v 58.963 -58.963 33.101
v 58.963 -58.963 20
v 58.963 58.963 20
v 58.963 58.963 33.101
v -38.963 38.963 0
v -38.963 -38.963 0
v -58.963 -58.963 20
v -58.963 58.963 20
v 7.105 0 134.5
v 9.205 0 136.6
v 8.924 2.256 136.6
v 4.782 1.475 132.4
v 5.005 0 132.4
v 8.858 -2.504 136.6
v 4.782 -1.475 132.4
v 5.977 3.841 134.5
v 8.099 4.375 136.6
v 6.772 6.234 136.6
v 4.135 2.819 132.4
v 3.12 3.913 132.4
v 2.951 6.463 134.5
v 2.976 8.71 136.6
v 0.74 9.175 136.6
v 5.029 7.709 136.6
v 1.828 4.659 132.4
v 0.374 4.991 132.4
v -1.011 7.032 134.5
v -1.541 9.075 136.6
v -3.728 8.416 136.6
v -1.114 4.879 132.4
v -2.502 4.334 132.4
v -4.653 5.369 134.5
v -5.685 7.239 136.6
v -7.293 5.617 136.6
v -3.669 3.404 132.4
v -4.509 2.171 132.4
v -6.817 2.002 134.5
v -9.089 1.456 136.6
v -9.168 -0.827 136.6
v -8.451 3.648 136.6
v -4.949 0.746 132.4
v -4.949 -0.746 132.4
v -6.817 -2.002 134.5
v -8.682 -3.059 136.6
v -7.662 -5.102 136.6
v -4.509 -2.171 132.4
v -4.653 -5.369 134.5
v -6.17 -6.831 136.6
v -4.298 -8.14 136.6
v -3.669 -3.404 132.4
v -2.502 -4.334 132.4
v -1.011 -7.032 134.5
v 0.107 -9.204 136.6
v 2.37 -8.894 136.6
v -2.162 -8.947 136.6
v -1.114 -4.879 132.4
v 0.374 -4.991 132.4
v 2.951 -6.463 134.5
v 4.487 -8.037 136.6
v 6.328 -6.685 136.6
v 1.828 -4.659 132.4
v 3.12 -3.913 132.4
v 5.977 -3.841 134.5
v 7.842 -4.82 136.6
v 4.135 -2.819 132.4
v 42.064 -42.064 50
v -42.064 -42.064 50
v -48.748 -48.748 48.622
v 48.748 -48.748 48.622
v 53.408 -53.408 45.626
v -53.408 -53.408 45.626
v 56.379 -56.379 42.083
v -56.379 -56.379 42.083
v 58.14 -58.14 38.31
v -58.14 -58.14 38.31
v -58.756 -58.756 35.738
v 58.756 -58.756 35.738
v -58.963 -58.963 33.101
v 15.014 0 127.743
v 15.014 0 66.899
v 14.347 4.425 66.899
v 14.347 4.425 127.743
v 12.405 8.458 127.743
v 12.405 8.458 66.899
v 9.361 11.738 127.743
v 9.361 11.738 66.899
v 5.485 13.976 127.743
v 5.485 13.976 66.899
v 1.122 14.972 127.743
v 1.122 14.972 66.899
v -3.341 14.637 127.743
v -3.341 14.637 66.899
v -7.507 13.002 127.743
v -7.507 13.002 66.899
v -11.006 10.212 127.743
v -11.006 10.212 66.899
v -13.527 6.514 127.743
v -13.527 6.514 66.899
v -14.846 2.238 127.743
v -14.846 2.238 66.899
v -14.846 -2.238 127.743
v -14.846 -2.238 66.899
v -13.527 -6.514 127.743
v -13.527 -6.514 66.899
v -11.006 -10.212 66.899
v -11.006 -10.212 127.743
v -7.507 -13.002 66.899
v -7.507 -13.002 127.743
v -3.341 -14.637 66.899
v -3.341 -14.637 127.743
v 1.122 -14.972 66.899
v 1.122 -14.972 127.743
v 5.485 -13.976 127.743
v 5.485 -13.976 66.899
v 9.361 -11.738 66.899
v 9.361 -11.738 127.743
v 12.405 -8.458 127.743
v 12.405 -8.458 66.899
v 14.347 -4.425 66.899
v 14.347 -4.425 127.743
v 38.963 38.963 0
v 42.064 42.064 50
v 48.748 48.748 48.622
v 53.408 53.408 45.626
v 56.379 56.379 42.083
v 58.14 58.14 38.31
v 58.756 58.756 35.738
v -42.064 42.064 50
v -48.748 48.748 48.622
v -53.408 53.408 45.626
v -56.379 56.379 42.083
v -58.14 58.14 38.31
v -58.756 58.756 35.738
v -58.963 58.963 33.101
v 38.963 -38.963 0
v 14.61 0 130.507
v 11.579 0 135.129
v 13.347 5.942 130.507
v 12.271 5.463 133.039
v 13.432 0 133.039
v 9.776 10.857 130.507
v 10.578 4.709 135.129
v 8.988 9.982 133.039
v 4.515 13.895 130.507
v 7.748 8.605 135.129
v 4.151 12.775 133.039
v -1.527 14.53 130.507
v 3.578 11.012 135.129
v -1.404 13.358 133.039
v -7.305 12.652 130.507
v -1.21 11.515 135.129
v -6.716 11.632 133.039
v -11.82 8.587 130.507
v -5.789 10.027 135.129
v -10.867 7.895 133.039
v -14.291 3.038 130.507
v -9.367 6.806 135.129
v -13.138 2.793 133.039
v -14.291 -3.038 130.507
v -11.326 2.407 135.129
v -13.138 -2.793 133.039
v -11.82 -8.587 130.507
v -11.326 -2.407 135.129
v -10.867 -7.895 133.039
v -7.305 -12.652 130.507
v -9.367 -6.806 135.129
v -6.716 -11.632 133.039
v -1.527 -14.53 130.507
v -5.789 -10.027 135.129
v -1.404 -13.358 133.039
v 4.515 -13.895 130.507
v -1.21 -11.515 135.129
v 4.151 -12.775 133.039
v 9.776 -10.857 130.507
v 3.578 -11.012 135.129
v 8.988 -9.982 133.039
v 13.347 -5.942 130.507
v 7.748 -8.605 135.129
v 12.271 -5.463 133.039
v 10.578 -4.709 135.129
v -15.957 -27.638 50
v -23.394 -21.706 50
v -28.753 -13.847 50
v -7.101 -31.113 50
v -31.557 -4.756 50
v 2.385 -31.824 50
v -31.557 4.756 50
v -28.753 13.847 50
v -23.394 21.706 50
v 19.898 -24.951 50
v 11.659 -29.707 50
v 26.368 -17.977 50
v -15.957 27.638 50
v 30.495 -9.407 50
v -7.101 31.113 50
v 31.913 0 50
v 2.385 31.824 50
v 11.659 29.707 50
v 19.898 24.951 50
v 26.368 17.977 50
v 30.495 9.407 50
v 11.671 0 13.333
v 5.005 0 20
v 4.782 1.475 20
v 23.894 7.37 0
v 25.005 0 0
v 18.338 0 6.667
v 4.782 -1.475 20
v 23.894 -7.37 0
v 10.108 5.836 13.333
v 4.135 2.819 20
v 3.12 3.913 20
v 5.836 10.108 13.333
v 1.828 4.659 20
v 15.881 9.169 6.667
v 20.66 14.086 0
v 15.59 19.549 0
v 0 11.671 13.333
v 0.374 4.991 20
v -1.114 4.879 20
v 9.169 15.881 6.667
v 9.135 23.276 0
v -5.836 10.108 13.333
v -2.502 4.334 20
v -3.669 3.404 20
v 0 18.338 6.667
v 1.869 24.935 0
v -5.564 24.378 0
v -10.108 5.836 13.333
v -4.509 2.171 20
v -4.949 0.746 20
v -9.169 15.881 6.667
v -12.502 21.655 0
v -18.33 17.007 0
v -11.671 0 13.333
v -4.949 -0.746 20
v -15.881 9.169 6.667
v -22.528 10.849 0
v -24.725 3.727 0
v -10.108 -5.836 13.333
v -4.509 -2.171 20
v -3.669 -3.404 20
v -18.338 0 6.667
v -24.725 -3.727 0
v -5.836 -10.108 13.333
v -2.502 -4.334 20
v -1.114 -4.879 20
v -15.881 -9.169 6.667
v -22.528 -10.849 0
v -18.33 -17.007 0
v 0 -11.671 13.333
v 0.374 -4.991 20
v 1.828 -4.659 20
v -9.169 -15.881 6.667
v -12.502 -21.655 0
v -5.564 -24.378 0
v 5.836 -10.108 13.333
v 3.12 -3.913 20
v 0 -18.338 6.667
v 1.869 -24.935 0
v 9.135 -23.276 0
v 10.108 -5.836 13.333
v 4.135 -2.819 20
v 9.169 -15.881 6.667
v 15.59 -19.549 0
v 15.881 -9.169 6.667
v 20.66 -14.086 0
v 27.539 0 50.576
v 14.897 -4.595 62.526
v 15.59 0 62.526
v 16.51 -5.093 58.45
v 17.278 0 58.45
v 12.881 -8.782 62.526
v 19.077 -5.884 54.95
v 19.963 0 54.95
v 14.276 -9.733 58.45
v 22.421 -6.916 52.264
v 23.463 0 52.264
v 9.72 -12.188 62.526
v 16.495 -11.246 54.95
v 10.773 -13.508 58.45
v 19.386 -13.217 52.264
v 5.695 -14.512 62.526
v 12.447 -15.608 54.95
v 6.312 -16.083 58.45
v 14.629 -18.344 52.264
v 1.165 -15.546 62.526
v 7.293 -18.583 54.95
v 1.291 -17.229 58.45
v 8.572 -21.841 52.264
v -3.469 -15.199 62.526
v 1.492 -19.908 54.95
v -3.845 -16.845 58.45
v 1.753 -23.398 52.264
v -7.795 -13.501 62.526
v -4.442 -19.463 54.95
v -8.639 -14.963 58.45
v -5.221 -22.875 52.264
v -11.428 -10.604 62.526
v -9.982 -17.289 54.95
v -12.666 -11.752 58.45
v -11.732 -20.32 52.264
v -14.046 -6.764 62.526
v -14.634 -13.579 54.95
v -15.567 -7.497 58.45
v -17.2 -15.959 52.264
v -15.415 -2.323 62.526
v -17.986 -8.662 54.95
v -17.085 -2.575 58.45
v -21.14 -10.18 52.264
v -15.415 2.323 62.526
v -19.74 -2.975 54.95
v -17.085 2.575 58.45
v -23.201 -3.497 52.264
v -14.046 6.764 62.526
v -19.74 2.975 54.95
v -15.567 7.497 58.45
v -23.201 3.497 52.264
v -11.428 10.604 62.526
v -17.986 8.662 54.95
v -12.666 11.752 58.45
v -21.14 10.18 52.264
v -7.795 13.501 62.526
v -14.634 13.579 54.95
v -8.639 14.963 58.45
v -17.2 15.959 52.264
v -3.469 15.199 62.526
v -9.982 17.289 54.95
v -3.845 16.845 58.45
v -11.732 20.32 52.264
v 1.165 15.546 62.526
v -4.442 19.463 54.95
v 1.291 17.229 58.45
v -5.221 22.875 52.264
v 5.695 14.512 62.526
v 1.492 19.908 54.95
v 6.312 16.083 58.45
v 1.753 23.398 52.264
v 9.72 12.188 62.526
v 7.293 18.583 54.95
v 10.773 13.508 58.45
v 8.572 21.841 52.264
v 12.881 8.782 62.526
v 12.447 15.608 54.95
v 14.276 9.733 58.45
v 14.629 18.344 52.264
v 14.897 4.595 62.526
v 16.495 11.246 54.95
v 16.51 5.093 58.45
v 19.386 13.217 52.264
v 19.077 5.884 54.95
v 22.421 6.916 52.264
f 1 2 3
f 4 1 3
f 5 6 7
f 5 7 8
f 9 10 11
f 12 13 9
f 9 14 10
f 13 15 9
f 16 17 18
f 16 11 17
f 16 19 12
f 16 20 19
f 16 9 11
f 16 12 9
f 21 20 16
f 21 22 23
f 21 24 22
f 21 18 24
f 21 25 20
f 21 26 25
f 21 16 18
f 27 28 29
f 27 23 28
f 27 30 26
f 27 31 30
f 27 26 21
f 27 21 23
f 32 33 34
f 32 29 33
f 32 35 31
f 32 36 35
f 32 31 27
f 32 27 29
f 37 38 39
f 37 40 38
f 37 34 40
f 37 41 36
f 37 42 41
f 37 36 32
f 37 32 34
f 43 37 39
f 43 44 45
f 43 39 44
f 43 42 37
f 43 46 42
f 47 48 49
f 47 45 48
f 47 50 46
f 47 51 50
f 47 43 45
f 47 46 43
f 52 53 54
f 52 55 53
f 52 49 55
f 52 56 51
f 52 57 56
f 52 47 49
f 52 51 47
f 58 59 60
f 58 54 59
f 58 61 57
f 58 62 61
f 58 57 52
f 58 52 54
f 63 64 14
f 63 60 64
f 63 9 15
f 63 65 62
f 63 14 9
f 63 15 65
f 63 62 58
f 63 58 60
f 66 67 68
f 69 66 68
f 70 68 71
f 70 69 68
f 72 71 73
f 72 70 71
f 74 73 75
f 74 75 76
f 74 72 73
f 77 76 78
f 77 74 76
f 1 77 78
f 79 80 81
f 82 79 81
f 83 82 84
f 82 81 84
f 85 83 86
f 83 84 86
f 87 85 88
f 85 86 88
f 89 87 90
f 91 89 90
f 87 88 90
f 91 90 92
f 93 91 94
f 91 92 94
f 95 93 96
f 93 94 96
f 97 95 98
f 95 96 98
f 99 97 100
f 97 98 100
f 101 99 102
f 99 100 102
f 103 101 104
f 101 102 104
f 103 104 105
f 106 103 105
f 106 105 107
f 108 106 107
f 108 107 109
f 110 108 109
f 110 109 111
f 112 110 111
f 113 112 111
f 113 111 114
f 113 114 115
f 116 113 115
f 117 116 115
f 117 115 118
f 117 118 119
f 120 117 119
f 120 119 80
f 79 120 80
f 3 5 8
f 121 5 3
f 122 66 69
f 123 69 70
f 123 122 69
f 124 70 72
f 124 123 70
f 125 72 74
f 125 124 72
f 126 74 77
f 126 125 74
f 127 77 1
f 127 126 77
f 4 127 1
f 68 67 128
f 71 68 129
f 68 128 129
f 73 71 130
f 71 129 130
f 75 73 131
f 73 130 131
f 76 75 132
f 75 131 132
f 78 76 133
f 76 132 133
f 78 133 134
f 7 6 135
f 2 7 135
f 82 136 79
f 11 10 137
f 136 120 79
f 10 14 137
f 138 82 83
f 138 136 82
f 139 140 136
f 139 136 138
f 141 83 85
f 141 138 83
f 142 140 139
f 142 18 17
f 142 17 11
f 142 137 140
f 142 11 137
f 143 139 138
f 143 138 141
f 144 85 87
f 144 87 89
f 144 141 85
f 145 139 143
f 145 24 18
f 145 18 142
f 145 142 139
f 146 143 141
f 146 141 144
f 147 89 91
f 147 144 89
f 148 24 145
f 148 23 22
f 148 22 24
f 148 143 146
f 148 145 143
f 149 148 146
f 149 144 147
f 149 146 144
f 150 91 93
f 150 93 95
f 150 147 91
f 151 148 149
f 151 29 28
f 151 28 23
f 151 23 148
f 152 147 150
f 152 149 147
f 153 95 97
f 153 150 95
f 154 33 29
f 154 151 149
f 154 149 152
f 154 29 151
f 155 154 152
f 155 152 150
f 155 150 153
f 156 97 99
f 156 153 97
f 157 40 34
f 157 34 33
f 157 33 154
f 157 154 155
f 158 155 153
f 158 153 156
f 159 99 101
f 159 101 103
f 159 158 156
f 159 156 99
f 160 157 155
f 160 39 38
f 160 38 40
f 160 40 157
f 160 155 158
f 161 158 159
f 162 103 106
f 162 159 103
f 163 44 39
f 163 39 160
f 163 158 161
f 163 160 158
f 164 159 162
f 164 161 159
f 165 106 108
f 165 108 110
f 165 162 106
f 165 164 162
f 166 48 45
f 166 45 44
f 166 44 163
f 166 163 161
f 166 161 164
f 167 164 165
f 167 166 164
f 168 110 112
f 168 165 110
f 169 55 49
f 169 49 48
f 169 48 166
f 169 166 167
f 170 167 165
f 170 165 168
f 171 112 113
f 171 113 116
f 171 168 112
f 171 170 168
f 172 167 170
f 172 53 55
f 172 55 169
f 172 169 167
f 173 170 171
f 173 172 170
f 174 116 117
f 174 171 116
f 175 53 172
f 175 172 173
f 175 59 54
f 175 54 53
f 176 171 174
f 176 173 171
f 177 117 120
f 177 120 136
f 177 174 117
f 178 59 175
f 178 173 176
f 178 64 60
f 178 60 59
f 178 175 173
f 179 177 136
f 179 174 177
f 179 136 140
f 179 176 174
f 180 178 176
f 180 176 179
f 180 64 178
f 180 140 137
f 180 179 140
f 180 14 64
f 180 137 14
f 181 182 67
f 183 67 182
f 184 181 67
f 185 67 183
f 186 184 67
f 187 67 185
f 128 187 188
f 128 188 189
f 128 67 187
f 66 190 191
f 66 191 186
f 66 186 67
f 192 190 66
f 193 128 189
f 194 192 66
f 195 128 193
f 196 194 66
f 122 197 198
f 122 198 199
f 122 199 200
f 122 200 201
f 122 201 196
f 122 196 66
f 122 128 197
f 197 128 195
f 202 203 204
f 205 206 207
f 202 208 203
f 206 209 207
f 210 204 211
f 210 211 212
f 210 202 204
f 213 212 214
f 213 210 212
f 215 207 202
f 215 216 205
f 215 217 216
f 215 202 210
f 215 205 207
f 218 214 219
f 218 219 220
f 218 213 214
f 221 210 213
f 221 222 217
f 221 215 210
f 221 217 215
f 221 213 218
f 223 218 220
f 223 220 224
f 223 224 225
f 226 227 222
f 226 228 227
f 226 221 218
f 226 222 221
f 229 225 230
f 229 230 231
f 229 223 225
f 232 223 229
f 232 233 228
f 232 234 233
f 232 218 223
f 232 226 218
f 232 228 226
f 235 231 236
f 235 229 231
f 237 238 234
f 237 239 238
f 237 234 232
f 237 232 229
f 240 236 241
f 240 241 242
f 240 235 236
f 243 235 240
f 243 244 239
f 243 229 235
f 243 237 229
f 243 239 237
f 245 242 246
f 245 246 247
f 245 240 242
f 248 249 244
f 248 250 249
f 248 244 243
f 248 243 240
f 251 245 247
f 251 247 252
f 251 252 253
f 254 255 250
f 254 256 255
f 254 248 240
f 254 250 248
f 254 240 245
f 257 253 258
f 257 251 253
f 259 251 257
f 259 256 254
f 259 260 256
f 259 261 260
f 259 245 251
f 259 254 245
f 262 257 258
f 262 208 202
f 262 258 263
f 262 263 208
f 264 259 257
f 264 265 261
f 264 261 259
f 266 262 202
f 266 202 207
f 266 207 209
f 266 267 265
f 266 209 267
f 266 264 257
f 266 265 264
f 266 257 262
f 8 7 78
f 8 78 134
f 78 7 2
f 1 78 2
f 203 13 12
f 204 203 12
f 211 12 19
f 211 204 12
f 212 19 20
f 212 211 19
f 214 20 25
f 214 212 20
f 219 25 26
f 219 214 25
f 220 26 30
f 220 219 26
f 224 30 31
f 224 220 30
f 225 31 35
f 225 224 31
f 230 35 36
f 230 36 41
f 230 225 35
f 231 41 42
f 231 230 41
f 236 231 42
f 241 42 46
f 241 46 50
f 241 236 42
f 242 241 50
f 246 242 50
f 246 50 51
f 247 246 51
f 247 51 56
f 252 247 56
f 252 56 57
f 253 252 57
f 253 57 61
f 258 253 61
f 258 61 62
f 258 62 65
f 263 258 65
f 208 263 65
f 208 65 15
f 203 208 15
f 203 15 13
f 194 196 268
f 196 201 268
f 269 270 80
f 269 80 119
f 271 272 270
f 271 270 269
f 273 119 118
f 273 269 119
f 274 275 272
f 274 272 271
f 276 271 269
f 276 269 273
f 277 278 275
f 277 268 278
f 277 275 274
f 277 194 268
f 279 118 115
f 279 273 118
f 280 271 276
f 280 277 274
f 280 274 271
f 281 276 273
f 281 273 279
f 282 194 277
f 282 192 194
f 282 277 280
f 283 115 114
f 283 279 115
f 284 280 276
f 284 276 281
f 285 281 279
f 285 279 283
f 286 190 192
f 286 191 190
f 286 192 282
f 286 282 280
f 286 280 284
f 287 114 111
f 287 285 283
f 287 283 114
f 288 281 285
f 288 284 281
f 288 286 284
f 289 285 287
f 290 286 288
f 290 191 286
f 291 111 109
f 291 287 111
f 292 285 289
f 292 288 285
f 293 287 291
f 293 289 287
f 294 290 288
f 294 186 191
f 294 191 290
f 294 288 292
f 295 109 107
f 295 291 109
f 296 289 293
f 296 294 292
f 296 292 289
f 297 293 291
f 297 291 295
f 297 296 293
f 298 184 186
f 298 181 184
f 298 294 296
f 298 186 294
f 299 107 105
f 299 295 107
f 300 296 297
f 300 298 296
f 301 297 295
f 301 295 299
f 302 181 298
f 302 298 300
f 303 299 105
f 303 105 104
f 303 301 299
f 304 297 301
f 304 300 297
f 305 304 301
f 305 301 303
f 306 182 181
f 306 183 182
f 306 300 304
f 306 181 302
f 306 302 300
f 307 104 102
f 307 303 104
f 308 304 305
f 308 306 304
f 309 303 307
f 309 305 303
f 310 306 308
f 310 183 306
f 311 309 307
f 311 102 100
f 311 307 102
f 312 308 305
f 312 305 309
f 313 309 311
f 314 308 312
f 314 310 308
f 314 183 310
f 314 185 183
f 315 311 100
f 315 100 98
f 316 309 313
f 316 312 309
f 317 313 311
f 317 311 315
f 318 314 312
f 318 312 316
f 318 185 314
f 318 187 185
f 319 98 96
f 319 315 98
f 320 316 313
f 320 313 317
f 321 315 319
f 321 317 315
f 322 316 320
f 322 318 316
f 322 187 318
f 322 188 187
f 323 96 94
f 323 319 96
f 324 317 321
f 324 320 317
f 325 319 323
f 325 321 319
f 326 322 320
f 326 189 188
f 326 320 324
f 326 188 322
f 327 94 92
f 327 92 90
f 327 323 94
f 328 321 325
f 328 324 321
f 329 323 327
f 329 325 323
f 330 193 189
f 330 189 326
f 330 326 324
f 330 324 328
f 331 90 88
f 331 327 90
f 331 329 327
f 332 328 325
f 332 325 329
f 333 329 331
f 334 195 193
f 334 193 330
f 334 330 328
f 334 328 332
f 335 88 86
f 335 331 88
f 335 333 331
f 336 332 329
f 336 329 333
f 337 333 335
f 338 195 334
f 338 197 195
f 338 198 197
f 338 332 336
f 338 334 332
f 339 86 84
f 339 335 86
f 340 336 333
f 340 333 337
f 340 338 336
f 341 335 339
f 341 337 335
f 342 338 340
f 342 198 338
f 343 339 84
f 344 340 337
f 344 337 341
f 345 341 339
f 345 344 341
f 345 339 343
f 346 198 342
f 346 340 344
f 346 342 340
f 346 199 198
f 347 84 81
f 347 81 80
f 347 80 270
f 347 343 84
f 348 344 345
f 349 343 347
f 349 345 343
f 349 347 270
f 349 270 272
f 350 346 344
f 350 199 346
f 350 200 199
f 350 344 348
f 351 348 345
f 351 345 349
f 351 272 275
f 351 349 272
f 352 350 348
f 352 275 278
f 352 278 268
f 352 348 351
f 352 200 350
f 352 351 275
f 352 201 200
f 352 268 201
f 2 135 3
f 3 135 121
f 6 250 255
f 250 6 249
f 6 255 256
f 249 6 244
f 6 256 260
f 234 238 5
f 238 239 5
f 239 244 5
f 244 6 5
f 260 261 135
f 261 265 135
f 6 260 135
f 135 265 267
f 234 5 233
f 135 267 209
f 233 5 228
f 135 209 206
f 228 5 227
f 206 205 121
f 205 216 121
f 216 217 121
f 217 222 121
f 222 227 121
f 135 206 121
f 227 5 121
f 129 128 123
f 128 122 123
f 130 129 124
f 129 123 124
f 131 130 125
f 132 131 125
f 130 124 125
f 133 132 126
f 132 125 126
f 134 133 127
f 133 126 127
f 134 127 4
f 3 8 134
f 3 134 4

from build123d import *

# Parameters (mm, degrees)
F0_W     = 117.9269552231
F0_H     = 117.9269552231
F0_R     = 15.0136724475
F0_R_2   = 5.0045574825
F1_DEPTH = 50
F2_DEPTH = 137.4
F3_R     = 9.6568542495
F5_R     = 16.8994949366
F6_SIZE  = 20


# Not quite as in the source:
# - a fillet or chamfer that OpenCascade refuses, or shapes differently, is made with other operations: its cross-section is extruded or revolved along the edge and cut away or added


with BuildPart() as f1:
    # F0 (on Top) → F1 (new body)
    with BuildSketch(Plane.XY):
        Rectangle(F0_W, F0_H)
        Circle(F0_R, mode=Mode.SUBTRACT)
        Circle(F0_R)
        Circle(F0_R_2, mode=Mode.SUBTRACT)
    extrude(amount=F1_DEPTH)

    # F0 (on Top) → F2 (join)
    with BuildSketch(Plane.XY):
        Circle(F0_R)
        Circle(F0_R_2, mode=Mode.SUBTRACT)
    extrude(amount=F2_DEPTH)

    # F3
    f3_edges = [f1.edges().sort_by_distance(p)[0] for p in [
        (-15.013672, 0, 137.4),
    ]]
    fillet(f3_edges, radius=F3_R)

    # F4: chamfer of 5 on 1 edges, made by hand

    # F4_s1 → F4_t2 (revolve, cut)
    with BuildSketch(Plane.XZ):
        Polygon((10.0045574825, 137.4), (5.0045574825, 132.4), (5.0045574825, 137.4), align=None)
    revolve(axis=Axis((0, 0, 137.4), (0, 0, 1)), mode=Mode.SUBTRACT)

    # F5
    f5_edges = [f1.edges().sort_by_distance(p)[0] for p in [
        (58.963478, 0, 50),
        (0, -58.963478, 50),
        (0, 58.963478, 50),
        (-58.963478, 0, 50),
        (-15.013672, 0, 50),
    ]]
    fillet(f5_edges, radius=F5_R)

    # F6
    f6_edges = [f1.edges().sort_by_distance(p)[0] for p in [
        (-58.963478, 0, 0),
        (0, 58.963478, 0),
        (58.963478, 0, 0),
        (0, -58.963478, 0),
        (-5.004557, 0, 0),
    ]]
    chamfer(f6_edges, length=F6_SIZE)


solid = f1.part
